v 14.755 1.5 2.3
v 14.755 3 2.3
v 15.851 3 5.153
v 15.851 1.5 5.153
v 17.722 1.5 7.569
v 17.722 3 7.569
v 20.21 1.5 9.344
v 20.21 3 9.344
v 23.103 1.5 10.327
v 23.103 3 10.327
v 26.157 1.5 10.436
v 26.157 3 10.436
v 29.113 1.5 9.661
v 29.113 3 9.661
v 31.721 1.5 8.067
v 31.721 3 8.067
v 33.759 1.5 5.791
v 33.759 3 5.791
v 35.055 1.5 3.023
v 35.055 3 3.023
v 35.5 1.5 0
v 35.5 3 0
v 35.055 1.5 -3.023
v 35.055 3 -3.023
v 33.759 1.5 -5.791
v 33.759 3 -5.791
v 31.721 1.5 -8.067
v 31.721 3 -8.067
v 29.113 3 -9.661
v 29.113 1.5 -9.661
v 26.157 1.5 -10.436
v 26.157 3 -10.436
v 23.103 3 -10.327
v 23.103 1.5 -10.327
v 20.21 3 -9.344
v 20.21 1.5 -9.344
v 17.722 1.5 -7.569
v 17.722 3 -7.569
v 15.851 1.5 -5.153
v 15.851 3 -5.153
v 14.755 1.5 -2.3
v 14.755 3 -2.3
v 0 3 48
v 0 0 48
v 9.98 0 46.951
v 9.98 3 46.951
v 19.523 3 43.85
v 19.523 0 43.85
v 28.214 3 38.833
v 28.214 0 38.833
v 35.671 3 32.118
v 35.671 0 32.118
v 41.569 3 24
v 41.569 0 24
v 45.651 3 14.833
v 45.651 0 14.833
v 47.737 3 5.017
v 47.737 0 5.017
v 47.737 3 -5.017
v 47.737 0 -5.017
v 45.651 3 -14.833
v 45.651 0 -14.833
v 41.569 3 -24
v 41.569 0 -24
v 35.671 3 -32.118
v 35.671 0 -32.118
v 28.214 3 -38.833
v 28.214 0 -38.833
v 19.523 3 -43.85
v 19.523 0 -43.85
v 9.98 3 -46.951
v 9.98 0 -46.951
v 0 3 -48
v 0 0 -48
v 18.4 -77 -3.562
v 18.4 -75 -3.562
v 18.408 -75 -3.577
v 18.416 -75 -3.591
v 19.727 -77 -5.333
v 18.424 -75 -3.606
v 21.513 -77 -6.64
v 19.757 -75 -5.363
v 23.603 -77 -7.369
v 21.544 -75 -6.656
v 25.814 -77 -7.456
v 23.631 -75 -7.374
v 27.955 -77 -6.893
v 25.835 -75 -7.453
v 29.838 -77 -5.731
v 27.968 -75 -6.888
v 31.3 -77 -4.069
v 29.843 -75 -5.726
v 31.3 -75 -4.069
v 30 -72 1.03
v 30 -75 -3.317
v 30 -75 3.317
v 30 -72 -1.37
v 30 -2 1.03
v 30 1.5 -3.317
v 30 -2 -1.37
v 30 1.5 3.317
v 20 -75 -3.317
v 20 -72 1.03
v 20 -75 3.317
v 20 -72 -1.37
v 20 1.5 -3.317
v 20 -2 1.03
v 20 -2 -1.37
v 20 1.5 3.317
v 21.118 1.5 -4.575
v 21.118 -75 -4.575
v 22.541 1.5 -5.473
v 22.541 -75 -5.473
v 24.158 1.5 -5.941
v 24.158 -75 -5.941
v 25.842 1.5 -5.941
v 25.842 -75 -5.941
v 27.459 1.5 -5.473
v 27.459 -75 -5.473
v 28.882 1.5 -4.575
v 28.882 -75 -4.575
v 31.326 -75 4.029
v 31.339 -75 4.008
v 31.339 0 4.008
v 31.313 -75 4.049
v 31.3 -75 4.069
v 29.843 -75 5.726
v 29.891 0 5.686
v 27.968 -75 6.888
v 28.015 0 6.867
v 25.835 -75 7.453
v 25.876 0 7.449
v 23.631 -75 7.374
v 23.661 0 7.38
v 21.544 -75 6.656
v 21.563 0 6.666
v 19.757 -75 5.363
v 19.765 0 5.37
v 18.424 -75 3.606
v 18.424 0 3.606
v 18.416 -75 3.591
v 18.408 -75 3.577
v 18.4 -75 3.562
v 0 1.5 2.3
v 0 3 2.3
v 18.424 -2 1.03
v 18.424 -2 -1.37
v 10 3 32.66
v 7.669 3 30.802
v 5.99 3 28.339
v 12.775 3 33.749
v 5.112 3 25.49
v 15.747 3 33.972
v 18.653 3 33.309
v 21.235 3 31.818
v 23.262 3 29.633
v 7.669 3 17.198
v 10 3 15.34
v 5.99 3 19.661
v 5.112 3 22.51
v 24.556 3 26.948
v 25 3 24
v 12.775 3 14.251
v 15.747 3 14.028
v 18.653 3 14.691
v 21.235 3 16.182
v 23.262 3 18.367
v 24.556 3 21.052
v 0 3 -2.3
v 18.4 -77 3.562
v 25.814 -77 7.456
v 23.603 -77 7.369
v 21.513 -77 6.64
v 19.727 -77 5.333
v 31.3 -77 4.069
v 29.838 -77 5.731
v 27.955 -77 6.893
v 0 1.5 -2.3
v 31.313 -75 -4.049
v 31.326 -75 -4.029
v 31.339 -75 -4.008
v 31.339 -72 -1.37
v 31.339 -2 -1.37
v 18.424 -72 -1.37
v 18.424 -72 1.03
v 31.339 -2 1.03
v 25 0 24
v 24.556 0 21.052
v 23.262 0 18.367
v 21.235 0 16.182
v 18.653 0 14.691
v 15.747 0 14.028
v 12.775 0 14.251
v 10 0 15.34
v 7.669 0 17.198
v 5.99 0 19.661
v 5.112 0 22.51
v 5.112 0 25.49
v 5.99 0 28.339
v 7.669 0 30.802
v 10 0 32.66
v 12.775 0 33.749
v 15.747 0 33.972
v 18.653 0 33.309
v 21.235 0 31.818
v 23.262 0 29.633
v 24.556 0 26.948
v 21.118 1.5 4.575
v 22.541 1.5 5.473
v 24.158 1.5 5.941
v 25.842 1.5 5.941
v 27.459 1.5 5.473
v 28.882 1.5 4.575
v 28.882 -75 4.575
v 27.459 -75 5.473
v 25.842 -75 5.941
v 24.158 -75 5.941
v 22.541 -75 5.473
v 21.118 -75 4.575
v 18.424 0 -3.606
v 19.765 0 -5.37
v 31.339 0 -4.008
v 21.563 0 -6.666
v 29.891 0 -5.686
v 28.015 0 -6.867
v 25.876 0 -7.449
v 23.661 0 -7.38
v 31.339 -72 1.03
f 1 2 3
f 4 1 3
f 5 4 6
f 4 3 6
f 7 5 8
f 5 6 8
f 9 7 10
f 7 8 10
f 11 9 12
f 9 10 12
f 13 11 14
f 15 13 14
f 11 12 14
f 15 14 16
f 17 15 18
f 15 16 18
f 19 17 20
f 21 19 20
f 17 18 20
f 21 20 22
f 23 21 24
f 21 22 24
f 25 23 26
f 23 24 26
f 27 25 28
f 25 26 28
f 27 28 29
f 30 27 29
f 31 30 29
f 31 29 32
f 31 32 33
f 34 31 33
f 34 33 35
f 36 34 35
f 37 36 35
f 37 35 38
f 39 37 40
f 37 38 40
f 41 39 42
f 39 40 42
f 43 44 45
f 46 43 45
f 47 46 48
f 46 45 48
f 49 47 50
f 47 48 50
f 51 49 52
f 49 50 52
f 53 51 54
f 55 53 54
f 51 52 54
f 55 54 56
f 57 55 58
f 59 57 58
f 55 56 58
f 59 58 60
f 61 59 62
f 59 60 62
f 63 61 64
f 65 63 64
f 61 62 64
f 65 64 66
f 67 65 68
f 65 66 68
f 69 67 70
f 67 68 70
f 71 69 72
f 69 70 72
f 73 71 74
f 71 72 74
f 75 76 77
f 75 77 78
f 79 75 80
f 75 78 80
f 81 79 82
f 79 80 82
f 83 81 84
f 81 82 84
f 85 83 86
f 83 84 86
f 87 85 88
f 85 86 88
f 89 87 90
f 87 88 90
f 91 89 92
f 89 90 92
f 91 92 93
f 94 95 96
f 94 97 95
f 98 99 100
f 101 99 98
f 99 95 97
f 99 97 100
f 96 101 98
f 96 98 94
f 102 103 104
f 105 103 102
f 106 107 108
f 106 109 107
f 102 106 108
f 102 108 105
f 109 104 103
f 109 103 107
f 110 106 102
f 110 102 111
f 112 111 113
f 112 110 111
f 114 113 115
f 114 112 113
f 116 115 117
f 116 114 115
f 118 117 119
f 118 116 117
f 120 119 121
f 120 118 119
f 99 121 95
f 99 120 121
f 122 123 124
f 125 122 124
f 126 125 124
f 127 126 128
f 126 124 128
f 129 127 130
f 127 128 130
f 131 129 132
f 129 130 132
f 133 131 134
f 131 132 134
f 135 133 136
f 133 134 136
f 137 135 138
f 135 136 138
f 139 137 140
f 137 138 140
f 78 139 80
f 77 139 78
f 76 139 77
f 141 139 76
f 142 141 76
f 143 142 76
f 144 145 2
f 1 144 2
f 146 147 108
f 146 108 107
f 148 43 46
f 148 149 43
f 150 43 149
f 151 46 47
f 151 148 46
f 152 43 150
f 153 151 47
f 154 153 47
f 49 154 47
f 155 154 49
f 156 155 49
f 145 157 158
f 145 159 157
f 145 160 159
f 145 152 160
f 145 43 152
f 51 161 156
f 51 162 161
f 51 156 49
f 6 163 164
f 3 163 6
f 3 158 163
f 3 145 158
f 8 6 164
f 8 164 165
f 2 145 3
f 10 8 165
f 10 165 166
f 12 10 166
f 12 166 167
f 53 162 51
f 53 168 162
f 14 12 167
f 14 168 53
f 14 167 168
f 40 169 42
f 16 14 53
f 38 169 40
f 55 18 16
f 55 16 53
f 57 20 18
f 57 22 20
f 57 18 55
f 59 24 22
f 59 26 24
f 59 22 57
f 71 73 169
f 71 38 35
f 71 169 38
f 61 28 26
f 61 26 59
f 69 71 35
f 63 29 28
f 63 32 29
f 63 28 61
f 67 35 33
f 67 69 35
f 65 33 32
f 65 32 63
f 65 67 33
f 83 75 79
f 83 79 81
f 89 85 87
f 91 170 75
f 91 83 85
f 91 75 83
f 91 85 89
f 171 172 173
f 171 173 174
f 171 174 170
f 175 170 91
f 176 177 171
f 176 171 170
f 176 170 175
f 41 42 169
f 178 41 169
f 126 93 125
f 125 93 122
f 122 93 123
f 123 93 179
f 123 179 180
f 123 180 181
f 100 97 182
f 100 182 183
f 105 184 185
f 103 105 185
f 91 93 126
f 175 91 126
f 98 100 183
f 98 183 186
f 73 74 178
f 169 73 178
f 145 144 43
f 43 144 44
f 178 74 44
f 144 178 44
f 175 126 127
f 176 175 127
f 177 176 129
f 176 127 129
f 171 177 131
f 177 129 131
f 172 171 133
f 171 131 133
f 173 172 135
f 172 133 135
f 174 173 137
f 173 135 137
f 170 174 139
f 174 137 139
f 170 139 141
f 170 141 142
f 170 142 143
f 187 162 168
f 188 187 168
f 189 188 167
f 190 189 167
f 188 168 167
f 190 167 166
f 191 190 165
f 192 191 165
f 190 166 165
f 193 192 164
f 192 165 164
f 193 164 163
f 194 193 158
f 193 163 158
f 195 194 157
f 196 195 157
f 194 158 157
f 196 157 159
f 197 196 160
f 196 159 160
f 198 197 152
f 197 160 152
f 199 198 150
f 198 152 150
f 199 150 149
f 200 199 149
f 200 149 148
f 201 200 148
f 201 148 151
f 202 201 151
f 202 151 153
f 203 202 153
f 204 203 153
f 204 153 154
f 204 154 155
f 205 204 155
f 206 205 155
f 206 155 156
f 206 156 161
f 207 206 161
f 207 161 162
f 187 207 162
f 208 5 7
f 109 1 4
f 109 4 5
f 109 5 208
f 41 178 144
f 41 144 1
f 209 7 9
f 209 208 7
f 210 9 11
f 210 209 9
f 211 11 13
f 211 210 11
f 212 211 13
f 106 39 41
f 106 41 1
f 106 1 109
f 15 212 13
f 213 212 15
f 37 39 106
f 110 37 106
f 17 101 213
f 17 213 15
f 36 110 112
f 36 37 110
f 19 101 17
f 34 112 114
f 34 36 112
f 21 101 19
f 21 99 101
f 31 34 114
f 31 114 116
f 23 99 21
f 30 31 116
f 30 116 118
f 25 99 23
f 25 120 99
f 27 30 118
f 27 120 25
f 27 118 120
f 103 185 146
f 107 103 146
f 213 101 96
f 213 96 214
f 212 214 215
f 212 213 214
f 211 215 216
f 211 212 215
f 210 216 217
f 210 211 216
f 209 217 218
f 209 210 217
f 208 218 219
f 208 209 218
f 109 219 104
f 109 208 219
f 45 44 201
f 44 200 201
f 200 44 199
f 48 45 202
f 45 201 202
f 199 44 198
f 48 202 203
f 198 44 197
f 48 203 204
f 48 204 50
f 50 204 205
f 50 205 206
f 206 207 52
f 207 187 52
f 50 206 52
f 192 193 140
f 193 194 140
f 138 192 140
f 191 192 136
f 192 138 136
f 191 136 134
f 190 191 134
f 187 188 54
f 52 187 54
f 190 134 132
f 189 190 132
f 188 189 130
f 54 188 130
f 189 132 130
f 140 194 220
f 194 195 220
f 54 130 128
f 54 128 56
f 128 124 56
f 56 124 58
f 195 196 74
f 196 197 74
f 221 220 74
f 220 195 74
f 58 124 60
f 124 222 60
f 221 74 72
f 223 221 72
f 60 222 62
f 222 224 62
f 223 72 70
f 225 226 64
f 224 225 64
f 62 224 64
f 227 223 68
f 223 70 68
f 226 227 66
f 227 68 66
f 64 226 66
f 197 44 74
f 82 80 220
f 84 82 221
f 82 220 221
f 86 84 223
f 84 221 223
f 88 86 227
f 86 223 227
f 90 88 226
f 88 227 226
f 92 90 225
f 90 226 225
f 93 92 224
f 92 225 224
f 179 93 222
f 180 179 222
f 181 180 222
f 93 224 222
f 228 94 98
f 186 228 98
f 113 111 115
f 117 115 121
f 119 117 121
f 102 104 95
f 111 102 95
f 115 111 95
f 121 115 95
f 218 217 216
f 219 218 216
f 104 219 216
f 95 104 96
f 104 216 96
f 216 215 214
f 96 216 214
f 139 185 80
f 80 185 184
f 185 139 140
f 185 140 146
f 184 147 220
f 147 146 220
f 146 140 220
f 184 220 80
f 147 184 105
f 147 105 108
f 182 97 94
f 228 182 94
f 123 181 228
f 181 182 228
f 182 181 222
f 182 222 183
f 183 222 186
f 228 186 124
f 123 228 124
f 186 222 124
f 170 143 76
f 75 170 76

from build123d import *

# Parameters (mm, degrees)
BOSS_EXTRUDE2_DEPTH = 3
CUT_EXTRUDE1_DEPTH  = 1.5
CUT_EXTRUDE4_DEPTH  = 4
BOSS_EXTRUDE4_DEPTH = 75
BOSS_EXTRUDE6_DEPTH = 2
SKETCH9_W           = 2.4
SKETCH9_H           = 70
CUT_EXTRUDE5_DEPTH  = 20
SKETCH11_R          = 10
CUT_EXTRUDE6_DEPTH  = 4


with BuildPart() as part:
    # Sketch2 → Boss-Extrude2 (new body)
    with BuildSketch(Plane(origin=(0, 0, 0), x_dir=(1, 0, 0), z_dir=(0, 1, 0))):
        with BuildLine():
            Line((0, 48), (0, -48))
            ThreePointArc((0, -48), (48, 0), (0, 48))
        make_face()
    extrude(amount=BOSS_EXTRUDE2_DEPTH)

    # Sketch3 → Cut-Extrude1 (cut)
    with BuildSketch(Plane(origin=(0, 3, 0), x_dir=(1, 0, 0), z_dir=(0, 1, 0))):
        with BuildLine():
            Line((14.75500122, 2.3), (0, 2.3))
            Line((0, 2.3), (0, -2.3))
            Line((0, -2.3), (14.75500122, -2.3))
            ThreePointArc((14.75500122, -2.3), (35.5, 0), (14.75500122, 2.3))
        make_face()
    extrude(amount=-CUT_EXTRUDE1_DEPTH, mode=Mode.SUBTRACT)

    # Sketch4 → Cut-Extrude4 (cut)
    with BuildSketch(Plane(origin=(0, 1.5, 0), x_dir=(1, 0, 0), z_dir=(0, 1, 0))):
        with BuildLine():
            Line((20, 3.31662479), (20, -3.31662479))
            ThreePointArc((20, -3.31662479), (25, -6), (30, -3.31662479))
            Line((30, -3.31662479), (30, 3.31662479))
            ThreePointArc((30, 3.31662479), (25, 6), (20, 3.31662479))
        make_face()
    extrude(amount=-CUT_EXTRUDE4_DEPTH, mode=Mode.SUBTRACT)

    # Sketch6 → Boss-Extrude4 (add)
    with BuildSketch(Plane.XZ):
        with BuildLine():
            Line((18.423549772, 3.60559321), (18.423549772, -3.60559321))
            ThreePointArc((18.423549772, -3.60559321), (24.766267094, -7.496357044), (31.339052831, -4.008292554))
            Line((31.339052831, -4.008292554), (31.339052831, 4.008292554))
            ThreePointArc((31.339052831, 4.008292554), (24.766267094, 7.496357044), (18.423549772, 3.60559321))
        make_face()
        with BuildLine():
            Line((20, 3.31662479), (20, -3.31662479))
            ThreePointArc((20, -3.31662479), (25, -6), (30, -3.31662479))
            Line((30, -3.31662479), (30, 3.31662479))
            ThreePointArc((30, 3.31662479), (25, 6), (20, 3.31662479))
        make_face(mode=Mode.SUBTRACT)
    extrude(amount=BOSS_EXTRUDE4_DEPTH)

    # Sketch8 → Boss-Extrude6 (add)
    with BuildSketch(Plane.XZ.offset(75)):
        with BuildLine():
            Line((18.4, 3.562302626), (18.4, -3.562302626))
            ThreePointArc((18.4, -3.562302626), (24.705404639, -7.494212005), (31.3, -4.06939799))
            Line((31.3, -4.06939799), (31.3, 4.06939799))
            ThreePointArc((31.3, 4.06939799), (24.705404639, 7.494212005), (18.4, 3.562302626))
        make_face()
    extrude(amount=BOSS_EXTRUDE6_DEPTH)

    # Sketch9 → Cut-Extrude5 (cut)
    with BuildSketch(Plane.ZY.offset(-18.423549772)):
        with Locations((-0.170167771, -37)):
            Rectangle(SKETCH9_W, SKETCH9_H)
    extrude(amount=-CUT_EXTRUDE5_DEPTH, mode=Mode.SUBTRACT)

    # Sketch11 → Cut-Extrude6 (cut)
    with BuildSketch(Plane(origin=(0, 3, 0), x_dir=(1, 0, 0), z_dir=(0, 1, 0))):
        with Locations((15, -24)):
            Circle(SKETCH11_R)
    extrude(amount=-CUT_EXTRUDE6_DEPTH, mode=Mode.SUBTRACT)


solid = part.part
